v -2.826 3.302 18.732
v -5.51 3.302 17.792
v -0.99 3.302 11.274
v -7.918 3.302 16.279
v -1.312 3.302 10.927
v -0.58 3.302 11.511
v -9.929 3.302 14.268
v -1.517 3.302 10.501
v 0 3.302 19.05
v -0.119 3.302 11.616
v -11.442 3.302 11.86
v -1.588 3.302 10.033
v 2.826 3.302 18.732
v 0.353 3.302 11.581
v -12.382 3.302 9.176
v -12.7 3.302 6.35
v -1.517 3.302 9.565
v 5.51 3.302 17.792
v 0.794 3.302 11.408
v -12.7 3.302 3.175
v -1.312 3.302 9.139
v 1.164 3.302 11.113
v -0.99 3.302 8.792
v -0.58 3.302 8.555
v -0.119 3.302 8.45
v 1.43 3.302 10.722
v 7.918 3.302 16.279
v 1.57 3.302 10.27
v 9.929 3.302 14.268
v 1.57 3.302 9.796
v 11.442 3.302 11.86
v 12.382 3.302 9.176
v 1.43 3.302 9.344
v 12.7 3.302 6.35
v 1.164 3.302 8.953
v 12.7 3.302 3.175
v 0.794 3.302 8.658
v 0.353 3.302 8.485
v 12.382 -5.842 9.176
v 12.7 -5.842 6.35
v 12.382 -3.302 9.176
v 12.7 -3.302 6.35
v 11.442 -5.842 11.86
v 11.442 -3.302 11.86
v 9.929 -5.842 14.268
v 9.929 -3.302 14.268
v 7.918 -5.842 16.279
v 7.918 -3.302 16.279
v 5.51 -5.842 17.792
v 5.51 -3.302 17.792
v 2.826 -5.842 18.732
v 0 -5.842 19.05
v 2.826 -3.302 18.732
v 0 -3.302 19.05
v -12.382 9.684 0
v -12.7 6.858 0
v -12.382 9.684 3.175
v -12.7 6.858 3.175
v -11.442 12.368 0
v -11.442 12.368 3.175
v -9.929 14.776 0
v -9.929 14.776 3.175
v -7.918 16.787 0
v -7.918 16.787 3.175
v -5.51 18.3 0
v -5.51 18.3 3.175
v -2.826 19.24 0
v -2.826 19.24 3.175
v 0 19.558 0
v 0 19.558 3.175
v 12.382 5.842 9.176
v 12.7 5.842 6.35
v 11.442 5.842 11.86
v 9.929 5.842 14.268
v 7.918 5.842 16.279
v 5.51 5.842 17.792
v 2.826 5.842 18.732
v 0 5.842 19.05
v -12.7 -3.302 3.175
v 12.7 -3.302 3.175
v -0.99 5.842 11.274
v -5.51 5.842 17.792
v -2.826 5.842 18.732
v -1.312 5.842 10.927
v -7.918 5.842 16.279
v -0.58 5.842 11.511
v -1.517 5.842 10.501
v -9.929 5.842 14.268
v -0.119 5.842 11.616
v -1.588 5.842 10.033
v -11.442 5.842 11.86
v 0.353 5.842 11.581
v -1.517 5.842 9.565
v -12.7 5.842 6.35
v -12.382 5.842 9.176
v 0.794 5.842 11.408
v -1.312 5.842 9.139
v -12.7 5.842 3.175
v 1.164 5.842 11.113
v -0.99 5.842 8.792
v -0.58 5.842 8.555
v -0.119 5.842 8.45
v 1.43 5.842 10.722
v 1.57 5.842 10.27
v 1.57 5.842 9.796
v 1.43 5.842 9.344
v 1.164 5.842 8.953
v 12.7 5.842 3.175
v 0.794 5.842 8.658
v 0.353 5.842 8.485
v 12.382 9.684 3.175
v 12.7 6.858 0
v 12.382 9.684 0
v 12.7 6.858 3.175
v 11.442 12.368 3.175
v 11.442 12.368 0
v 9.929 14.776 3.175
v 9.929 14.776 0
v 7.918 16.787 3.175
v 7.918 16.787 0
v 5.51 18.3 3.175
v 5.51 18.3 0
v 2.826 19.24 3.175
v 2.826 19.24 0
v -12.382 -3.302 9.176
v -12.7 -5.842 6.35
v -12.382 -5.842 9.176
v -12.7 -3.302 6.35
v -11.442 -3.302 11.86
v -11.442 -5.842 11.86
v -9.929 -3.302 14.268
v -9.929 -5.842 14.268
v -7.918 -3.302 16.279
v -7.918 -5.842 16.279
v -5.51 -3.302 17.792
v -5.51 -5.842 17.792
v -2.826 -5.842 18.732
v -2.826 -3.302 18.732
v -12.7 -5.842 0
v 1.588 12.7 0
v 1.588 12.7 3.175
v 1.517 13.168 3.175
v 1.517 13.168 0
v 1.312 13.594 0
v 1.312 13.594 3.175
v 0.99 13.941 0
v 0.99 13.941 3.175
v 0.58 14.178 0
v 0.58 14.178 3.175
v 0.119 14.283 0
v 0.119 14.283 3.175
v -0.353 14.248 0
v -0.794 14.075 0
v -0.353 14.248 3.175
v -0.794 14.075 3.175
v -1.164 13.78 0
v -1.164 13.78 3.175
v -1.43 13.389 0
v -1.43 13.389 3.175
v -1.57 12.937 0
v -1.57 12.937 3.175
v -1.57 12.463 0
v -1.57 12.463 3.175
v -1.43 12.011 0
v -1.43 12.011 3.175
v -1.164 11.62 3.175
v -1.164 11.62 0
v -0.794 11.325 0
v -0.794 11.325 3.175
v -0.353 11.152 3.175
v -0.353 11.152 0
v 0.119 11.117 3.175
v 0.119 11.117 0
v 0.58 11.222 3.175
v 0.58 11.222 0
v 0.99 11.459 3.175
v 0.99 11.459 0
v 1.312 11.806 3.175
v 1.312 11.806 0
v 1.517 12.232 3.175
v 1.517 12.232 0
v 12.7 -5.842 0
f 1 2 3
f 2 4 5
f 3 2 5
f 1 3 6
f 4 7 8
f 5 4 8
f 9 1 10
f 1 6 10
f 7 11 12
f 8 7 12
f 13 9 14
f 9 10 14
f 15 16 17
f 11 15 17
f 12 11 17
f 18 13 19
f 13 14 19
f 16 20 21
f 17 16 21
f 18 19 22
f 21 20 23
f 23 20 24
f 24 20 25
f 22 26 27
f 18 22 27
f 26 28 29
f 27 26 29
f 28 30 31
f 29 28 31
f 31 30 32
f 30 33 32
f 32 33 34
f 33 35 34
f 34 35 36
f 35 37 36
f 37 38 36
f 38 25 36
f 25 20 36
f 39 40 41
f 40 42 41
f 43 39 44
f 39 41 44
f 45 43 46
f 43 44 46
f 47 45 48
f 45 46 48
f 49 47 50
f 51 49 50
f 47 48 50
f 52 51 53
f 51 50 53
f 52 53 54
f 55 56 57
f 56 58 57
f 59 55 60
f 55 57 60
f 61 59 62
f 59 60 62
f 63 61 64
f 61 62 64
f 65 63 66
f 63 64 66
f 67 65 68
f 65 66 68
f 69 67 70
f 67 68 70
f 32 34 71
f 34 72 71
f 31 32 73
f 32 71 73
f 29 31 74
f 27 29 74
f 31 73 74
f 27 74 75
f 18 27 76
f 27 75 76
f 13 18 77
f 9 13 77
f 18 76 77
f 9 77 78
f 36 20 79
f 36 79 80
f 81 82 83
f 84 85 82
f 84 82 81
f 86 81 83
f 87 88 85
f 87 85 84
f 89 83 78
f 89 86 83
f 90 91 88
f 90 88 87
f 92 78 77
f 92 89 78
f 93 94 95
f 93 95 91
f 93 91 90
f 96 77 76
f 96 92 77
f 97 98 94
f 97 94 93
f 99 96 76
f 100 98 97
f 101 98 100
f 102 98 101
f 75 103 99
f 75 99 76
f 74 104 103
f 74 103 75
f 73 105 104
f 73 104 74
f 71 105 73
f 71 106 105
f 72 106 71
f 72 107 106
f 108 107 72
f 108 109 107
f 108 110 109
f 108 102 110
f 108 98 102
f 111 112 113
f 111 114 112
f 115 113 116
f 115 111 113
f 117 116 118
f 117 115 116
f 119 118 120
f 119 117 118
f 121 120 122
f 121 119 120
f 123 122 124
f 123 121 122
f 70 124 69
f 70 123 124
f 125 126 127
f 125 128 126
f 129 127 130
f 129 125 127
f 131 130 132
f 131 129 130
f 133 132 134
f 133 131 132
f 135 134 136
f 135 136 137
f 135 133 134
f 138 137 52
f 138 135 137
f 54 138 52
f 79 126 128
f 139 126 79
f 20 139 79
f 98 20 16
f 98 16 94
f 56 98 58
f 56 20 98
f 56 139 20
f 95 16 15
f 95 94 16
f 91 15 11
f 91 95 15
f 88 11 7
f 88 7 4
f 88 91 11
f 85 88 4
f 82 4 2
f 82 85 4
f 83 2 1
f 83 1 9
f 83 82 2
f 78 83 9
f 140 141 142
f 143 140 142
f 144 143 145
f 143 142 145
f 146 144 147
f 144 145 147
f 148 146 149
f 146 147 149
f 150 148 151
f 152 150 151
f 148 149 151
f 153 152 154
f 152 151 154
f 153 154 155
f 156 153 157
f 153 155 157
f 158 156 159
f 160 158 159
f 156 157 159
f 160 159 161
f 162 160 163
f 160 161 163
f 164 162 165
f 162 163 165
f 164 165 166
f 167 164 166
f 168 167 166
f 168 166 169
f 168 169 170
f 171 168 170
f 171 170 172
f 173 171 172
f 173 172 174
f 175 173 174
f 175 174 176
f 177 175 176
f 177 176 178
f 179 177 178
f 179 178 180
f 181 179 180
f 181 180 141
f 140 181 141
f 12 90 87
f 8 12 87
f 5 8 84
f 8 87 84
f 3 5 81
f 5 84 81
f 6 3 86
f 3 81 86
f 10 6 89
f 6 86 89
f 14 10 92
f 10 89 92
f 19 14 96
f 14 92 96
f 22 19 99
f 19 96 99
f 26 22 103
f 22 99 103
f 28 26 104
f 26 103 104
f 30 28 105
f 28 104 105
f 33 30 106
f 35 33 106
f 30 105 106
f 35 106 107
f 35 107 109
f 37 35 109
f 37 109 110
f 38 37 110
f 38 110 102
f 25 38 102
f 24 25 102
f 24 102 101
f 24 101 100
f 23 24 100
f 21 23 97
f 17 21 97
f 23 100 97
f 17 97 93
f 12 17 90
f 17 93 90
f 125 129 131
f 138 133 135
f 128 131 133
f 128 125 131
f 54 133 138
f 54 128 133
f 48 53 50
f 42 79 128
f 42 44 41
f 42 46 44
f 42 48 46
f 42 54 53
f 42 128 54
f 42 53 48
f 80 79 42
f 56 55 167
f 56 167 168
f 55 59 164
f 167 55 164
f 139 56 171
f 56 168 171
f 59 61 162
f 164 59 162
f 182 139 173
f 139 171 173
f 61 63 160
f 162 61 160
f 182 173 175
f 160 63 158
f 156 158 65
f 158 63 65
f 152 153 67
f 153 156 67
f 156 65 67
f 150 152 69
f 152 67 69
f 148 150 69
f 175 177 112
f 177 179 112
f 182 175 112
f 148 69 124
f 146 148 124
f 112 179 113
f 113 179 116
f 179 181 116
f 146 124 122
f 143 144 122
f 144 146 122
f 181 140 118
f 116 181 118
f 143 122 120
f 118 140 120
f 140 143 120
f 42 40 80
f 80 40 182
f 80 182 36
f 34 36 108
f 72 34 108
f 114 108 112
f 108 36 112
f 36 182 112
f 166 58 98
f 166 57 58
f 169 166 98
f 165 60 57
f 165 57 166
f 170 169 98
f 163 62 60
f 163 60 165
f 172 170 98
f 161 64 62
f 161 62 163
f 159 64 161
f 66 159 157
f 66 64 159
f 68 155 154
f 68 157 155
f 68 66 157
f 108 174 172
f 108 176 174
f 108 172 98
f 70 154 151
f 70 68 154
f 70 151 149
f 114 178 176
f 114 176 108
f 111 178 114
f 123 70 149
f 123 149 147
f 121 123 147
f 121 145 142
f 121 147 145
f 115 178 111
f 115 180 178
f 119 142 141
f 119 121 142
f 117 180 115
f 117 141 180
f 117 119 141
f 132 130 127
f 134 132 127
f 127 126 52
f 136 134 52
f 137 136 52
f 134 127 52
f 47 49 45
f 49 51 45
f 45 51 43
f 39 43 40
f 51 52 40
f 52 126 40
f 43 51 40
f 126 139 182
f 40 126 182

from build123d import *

# Parameters (mm, degrees)
F0_W     = 25.4
F0_H     = 6.604
F1_DEPTH = 3.175
F0_H_2   = 13.716
F0_H_3   = 2.54
F2_DEPTH = 19.05
F3_R     = 12.69999
F4_R     = 1.5875
F5_DEPTH = 25.4
F6_R     = 1.5875
F7_DEPTH = 2.54


# Not quite as in the source:
# - a fillet or chamfer is up to 0.001 mm smaller than in the source, because OpenCascade refuses the exact size


with BuildPart() as f1:
    # F0 (on Top) → F1 (new body)
    with BuildSketch(Plane.XY):
        Rectangle(F0_W, F0_H)
    extrude(amount=F1_DEPTH)



with BuildPart() as f1b:
    # F0 (on Top) → F1, piece 2 (new body)
    with BuildSketch(Plane.XY):
        with Locations((0, 12.7)):
            Rectangle(F0_W, F0_H_2)
    extrude(amount=F1_DEPTH)


with BuildPart() as f1_1:
    add(f1.part)

    add(f1b.part)  # F2 merges F1b
    # F0 (on Top) → F2 (join)
    with BuildSketch(Plane.XY):
        with Locations((0, -4.572)):
            Rectangle(F0_W, F0_H_3)
        with Locations((0, 4.572)):
            Rectangle(F0_W, F0_H_3)
    extrude(amount=F2_DEPTH)

    # F3 (radius 12.7 in the source; OpenCascade refuses exactly that, so slightly less here)
    f3_edges = [f1_1.edges().sort_by_distance(p)[0] for p in [
        (12.7, -4.572, 19.05),
        (12.7, 4.572, 19.05),
        (-12.7, -4.572, 19.05),
        (-12.7, 4.572, 19.05),
        (12.7, 19.558, 1.5875),
        (-12.7, 19.558, 1.5875),
    ]]
    fillet(f3_edges, radius=F3_R)

    # F4 (on face) → F5 (cut)
    with BuildSketch(Plane.XY.offset(3.175)):
        with Locations((0, 12.7)):
            Circle(F4_R)
    extrude(amount=-F5_DEPTH, mode=Mode.SUBTRACT)

    # F6 (on face) → F7 (cut, through all)
    with BuildSketch(Plane(origin=(0, 5.842, 0), x_dir=(-1, 0, 0), z_dir=(0, 1, 0))):
        with Locations((0, 10.033)):
            Circle(F6_R)
    extrude(amount=-F7_DEPTH, mode=Mode.SUBTRACT)


solid = f1_1.part
